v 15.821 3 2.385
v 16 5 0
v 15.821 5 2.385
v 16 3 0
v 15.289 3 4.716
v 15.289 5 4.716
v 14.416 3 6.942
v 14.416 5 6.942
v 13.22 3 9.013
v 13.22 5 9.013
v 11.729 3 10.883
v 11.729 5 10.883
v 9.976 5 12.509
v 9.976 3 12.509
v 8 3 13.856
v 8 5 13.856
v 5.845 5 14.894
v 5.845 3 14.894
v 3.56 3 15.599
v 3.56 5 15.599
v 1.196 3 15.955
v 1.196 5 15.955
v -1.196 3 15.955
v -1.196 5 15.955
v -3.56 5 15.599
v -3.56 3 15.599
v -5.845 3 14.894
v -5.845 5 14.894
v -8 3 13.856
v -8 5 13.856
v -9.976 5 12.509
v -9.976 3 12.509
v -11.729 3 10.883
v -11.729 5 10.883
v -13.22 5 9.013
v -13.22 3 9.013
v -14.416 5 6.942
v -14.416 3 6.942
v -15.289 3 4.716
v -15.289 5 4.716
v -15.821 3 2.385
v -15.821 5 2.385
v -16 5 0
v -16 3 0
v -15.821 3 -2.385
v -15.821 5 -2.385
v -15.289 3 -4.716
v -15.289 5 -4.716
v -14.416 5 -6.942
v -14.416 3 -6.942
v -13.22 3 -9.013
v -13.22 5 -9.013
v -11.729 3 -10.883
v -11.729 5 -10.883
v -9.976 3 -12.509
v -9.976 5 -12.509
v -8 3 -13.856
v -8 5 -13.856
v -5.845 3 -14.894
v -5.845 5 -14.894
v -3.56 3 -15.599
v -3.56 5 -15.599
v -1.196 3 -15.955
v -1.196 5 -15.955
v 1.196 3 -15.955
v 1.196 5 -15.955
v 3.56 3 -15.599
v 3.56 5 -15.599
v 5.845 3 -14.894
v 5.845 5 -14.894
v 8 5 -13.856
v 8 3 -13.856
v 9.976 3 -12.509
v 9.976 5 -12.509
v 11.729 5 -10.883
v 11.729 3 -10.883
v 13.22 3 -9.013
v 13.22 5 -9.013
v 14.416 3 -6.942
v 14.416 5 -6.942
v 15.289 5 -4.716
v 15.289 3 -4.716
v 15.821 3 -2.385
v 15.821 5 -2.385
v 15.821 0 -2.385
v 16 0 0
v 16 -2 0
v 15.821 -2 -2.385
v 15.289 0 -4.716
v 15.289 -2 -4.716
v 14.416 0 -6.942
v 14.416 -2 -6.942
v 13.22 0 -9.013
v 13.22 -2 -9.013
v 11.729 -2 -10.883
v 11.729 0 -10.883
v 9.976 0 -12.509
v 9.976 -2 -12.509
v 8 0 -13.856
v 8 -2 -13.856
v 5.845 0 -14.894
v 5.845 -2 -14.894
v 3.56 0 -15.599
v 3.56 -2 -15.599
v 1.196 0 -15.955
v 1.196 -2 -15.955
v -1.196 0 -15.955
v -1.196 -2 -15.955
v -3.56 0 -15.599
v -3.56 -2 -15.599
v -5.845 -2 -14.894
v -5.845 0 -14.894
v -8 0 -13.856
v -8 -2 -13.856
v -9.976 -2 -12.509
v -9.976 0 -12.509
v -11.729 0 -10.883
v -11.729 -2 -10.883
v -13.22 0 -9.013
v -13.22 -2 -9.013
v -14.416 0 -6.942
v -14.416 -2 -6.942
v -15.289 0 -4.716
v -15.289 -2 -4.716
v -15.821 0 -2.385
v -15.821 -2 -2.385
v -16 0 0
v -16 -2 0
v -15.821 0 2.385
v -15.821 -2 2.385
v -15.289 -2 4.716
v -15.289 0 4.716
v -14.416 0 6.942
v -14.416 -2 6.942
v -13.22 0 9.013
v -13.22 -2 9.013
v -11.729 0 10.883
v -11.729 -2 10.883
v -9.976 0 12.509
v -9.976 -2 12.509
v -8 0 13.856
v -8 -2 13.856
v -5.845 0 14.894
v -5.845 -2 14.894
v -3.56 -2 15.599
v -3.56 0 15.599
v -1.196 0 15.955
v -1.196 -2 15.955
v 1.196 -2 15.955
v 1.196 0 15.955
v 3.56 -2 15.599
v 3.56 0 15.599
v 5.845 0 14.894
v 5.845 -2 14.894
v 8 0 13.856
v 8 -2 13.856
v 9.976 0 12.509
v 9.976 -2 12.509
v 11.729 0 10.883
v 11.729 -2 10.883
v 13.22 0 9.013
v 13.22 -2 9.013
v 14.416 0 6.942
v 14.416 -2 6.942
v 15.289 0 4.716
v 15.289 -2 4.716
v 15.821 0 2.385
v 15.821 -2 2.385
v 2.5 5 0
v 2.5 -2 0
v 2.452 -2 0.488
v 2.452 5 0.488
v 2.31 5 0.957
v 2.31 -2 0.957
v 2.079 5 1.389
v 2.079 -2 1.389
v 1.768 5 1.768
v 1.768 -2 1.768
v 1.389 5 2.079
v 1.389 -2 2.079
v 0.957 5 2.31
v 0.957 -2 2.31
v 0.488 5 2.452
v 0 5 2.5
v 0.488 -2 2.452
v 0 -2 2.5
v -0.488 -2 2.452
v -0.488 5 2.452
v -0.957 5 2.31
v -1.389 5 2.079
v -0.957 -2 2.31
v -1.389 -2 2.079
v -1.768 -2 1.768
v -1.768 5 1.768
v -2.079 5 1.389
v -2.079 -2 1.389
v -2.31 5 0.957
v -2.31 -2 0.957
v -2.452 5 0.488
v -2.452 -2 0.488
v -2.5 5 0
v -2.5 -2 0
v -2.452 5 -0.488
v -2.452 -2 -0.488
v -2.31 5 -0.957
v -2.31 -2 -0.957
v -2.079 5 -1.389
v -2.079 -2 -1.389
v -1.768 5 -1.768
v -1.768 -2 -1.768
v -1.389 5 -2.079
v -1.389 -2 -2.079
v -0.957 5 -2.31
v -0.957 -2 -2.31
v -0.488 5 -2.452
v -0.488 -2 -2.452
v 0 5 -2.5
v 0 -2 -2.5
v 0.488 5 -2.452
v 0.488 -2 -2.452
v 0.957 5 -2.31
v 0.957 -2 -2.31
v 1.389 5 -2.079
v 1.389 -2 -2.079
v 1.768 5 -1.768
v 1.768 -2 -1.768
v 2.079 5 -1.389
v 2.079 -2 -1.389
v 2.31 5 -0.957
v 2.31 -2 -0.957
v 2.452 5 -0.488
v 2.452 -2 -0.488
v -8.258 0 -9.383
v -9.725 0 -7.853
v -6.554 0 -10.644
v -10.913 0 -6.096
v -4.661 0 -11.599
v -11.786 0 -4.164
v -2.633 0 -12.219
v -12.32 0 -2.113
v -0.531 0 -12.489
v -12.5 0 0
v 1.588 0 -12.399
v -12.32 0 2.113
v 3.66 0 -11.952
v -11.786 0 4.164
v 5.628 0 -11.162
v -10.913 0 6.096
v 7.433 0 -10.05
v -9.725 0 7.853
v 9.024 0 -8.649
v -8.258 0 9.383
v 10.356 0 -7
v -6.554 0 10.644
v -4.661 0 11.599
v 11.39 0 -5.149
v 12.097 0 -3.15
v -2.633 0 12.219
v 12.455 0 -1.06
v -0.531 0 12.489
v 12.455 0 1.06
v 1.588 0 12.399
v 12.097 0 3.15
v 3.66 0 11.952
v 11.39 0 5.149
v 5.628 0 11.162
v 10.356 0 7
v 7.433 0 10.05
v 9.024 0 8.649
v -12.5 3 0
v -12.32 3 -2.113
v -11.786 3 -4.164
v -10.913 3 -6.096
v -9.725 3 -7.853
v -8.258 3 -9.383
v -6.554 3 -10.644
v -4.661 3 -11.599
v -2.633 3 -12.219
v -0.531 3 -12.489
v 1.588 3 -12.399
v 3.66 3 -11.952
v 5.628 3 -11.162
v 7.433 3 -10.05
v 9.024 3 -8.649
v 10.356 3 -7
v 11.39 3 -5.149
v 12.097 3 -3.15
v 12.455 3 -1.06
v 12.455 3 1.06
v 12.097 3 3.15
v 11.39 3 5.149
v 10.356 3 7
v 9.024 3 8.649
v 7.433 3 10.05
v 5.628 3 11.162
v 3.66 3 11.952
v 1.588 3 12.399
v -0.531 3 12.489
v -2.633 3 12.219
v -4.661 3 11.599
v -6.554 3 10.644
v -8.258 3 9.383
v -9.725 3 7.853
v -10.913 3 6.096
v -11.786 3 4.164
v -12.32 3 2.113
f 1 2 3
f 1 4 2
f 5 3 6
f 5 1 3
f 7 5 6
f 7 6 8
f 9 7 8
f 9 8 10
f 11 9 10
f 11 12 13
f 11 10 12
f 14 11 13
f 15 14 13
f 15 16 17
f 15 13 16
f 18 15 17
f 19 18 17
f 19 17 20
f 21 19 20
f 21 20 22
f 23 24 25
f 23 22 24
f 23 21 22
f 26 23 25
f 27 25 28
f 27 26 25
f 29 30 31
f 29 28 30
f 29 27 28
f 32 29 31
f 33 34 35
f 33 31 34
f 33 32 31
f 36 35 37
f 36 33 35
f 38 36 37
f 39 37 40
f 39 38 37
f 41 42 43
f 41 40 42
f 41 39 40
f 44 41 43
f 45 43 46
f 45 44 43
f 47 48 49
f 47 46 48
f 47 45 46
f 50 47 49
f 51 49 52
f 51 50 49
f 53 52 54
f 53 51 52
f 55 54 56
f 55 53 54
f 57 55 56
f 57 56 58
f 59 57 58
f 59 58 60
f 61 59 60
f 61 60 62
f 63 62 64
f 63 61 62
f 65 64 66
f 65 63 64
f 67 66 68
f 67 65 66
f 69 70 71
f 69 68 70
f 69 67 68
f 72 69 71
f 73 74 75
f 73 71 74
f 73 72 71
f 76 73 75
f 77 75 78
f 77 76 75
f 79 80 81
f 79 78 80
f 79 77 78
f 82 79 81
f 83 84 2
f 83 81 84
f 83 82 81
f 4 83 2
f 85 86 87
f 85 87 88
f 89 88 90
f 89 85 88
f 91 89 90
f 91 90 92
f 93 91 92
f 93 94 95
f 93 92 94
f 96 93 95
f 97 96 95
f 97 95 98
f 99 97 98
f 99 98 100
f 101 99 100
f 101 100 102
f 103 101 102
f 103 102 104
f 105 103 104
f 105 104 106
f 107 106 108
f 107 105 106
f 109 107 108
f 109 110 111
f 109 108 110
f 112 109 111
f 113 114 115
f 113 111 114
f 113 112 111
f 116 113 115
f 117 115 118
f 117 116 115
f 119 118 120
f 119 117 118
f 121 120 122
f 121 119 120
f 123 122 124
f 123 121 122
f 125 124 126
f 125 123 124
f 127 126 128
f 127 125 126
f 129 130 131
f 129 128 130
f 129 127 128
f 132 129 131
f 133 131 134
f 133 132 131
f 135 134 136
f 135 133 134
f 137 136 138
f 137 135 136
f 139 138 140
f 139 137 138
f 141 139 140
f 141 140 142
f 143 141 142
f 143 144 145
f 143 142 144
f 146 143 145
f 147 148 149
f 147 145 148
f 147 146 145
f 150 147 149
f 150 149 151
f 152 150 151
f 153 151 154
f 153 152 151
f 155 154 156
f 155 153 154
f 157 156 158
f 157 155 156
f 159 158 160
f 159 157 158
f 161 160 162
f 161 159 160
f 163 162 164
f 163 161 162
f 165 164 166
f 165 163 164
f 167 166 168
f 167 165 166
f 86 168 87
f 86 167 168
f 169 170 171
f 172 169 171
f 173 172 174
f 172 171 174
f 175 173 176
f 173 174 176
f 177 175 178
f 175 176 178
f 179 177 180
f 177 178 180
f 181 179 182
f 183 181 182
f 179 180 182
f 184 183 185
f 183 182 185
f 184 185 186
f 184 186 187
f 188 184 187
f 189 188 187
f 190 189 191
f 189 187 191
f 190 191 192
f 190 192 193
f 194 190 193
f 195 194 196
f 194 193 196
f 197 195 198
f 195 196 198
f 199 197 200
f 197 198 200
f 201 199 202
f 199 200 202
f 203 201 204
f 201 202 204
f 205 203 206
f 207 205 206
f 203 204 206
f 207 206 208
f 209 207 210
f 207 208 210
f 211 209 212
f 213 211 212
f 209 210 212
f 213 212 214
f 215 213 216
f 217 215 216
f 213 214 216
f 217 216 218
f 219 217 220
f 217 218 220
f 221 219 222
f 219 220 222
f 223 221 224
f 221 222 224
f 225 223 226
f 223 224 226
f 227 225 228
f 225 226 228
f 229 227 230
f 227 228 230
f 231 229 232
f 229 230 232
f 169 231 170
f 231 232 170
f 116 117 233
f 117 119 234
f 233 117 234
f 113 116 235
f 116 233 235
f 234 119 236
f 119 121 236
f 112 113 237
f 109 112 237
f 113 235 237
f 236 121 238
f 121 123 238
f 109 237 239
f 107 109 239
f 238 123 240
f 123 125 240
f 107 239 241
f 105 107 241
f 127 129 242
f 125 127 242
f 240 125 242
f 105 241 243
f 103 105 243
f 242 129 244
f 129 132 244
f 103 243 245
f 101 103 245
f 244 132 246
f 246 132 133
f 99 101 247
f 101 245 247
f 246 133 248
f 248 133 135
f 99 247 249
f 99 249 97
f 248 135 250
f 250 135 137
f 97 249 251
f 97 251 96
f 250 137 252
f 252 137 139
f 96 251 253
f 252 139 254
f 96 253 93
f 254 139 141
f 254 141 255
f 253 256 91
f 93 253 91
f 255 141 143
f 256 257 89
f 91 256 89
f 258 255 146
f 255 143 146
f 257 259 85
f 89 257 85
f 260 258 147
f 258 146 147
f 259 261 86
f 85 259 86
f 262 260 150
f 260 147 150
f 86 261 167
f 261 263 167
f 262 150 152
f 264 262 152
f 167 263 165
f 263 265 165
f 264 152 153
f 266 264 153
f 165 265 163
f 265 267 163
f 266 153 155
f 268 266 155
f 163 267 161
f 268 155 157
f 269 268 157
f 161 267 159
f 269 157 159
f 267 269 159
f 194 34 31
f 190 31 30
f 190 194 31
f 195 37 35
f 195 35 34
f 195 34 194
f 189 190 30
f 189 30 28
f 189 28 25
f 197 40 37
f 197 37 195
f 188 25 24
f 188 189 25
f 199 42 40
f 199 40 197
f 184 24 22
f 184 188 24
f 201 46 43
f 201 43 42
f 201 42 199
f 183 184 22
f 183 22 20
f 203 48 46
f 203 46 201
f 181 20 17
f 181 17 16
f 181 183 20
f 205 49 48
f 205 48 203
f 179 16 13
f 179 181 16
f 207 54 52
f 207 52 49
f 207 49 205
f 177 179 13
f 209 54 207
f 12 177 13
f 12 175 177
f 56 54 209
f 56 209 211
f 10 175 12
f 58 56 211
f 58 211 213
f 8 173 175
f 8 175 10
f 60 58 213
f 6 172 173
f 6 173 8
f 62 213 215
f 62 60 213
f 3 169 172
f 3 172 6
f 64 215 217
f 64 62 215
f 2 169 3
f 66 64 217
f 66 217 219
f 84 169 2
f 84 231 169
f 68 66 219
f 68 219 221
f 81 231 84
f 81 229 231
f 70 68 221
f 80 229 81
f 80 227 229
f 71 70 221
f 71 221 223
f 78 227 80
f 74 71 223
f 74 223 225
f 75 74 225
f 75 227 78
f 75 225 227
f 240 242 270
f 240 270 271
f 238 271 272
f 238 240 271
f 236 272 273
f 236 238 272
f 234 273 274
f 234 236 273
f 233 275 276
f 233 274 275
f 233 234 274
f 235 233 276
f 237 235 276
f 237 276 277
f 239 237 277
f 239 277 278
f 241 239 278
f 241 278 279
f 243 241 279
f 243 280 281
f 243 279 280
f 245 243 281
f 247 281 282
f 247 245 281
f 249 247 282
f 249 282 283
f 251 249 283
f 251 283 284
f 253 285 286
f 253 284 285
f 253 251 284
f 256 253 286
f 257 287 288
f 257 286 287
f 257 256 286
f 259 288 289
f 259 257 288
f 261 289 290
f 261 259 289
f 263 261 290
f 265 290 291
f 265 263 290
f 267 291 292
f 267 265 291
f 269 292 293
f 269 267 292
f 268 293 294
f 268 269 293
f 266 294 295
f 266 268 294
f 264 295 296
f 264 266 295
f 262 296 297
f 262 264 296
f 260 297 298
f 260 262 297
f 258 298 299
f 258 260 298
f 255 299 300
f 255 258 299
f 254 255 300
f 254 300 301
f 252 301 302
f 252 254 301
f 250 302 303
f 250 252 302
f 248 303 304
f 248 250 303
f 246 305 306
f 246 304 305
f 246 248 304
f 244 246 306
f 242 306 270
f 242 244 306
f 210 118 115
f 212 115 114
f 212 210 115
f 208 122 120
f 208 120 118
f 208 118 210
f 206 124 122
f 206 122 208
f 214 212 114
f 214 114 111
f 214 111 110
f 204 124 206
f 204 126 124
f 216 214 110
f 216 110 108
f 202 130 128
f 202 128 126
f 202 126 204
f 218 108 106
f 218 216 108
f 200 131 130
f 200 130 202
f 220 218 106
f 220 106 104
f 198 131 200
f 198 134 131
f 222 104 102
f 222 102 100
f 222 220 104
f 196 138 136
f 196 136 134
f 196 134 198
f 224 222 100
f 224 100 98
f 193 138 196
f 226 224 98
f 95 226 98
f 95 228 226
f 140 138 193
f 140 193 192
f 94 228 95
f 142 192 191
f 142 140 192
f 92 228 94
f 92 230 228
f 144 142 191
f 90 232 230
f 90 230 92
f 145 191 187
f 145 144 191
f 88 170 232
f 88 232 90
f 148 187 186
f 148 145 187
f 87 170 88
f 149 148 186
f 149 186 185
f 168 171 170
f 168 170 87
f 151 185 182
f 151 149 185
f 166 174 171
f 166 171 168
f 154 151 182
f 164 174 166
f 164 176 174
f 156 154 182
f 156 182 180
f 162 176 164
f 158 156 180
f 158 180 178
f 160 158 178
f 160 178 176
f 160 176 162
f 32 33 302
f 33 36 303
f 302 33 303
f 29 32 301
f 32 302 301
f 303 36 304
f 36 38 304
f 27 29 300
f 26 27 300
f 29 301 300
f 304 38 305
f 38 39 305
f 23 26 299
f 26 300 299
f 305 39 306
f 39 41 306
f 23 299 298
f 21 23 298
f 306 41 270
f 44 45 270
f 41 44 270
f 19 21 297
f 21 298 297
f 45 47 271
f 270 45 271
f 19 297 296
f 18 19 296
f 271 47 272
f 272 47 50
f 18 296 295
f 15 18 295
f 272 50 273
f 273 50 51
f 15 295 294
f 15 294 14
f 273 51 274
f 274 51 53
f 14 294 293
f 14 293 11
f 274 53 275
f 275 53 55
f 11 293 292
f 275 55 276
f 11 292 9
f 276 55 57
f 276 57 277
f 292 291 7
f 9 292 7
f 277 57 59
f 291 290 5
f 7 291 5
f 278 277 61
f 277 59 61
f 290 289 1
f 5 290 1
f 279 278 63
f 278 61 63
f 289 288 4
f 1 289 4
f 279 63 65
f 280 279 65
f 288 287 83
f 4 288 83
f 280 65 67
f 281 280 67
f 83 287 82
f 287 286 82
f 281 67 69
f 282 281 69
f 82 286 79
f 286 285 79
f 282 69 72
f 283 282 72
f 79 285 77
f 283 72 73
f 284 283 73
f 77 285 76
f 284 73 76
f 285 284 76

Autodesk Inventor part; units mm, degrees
ref_plane "YZ Plane" through (0, 0, 0) normal (1, 0, 0) x (0, 1, 0)
ref_plane "XZ Plane" through (0, 0, 0) normal (0, 1, 0) x (-1, 0, 0)
ref_plane "XY Plane" through (0, 0, 0) normal (0, 0, 1) x (1, 0, 0)
sketch "Sketch1" plane through (0, 0, 0) normal (0, 1, 0) x (-1, 0, 0)
  circle A0 centre (0, 0) radius 12.5
  dimension "d0" = 25
extrude "Extrusion1" add sketch "Sketch1" along normal blind 3
sketch "Sketch2" plane through (0, 3, 0) normal (0, 1, 0) x (1, 0, 0)
  circle A0 centre (0, 0) radius 16
  dimension "d3" = 32
extrude "Extrusion2" add sketch "Sketch2" along normal blind 2
sketch "Sketch3" plane through (0, 0, 0) normal (0, -1, 0) x (1, 0, 0)
  circle A0 centre (0, 0) radius 16
  dimension "d6" = 32
extrude "Extrusion3" add sketch "Sketch3" along normal blind 2
sketch "Sketch4" plane through (0, -2, 0) normal (0, -1, 0) x (1, 0, 0)
  circle A0 centre (0, 0) radius 2.5
  dimension "d9" = 5
extrude "Extrusion4" cut sketch "Sketch4" against normal through all
properties part number "reverse gear piston"
